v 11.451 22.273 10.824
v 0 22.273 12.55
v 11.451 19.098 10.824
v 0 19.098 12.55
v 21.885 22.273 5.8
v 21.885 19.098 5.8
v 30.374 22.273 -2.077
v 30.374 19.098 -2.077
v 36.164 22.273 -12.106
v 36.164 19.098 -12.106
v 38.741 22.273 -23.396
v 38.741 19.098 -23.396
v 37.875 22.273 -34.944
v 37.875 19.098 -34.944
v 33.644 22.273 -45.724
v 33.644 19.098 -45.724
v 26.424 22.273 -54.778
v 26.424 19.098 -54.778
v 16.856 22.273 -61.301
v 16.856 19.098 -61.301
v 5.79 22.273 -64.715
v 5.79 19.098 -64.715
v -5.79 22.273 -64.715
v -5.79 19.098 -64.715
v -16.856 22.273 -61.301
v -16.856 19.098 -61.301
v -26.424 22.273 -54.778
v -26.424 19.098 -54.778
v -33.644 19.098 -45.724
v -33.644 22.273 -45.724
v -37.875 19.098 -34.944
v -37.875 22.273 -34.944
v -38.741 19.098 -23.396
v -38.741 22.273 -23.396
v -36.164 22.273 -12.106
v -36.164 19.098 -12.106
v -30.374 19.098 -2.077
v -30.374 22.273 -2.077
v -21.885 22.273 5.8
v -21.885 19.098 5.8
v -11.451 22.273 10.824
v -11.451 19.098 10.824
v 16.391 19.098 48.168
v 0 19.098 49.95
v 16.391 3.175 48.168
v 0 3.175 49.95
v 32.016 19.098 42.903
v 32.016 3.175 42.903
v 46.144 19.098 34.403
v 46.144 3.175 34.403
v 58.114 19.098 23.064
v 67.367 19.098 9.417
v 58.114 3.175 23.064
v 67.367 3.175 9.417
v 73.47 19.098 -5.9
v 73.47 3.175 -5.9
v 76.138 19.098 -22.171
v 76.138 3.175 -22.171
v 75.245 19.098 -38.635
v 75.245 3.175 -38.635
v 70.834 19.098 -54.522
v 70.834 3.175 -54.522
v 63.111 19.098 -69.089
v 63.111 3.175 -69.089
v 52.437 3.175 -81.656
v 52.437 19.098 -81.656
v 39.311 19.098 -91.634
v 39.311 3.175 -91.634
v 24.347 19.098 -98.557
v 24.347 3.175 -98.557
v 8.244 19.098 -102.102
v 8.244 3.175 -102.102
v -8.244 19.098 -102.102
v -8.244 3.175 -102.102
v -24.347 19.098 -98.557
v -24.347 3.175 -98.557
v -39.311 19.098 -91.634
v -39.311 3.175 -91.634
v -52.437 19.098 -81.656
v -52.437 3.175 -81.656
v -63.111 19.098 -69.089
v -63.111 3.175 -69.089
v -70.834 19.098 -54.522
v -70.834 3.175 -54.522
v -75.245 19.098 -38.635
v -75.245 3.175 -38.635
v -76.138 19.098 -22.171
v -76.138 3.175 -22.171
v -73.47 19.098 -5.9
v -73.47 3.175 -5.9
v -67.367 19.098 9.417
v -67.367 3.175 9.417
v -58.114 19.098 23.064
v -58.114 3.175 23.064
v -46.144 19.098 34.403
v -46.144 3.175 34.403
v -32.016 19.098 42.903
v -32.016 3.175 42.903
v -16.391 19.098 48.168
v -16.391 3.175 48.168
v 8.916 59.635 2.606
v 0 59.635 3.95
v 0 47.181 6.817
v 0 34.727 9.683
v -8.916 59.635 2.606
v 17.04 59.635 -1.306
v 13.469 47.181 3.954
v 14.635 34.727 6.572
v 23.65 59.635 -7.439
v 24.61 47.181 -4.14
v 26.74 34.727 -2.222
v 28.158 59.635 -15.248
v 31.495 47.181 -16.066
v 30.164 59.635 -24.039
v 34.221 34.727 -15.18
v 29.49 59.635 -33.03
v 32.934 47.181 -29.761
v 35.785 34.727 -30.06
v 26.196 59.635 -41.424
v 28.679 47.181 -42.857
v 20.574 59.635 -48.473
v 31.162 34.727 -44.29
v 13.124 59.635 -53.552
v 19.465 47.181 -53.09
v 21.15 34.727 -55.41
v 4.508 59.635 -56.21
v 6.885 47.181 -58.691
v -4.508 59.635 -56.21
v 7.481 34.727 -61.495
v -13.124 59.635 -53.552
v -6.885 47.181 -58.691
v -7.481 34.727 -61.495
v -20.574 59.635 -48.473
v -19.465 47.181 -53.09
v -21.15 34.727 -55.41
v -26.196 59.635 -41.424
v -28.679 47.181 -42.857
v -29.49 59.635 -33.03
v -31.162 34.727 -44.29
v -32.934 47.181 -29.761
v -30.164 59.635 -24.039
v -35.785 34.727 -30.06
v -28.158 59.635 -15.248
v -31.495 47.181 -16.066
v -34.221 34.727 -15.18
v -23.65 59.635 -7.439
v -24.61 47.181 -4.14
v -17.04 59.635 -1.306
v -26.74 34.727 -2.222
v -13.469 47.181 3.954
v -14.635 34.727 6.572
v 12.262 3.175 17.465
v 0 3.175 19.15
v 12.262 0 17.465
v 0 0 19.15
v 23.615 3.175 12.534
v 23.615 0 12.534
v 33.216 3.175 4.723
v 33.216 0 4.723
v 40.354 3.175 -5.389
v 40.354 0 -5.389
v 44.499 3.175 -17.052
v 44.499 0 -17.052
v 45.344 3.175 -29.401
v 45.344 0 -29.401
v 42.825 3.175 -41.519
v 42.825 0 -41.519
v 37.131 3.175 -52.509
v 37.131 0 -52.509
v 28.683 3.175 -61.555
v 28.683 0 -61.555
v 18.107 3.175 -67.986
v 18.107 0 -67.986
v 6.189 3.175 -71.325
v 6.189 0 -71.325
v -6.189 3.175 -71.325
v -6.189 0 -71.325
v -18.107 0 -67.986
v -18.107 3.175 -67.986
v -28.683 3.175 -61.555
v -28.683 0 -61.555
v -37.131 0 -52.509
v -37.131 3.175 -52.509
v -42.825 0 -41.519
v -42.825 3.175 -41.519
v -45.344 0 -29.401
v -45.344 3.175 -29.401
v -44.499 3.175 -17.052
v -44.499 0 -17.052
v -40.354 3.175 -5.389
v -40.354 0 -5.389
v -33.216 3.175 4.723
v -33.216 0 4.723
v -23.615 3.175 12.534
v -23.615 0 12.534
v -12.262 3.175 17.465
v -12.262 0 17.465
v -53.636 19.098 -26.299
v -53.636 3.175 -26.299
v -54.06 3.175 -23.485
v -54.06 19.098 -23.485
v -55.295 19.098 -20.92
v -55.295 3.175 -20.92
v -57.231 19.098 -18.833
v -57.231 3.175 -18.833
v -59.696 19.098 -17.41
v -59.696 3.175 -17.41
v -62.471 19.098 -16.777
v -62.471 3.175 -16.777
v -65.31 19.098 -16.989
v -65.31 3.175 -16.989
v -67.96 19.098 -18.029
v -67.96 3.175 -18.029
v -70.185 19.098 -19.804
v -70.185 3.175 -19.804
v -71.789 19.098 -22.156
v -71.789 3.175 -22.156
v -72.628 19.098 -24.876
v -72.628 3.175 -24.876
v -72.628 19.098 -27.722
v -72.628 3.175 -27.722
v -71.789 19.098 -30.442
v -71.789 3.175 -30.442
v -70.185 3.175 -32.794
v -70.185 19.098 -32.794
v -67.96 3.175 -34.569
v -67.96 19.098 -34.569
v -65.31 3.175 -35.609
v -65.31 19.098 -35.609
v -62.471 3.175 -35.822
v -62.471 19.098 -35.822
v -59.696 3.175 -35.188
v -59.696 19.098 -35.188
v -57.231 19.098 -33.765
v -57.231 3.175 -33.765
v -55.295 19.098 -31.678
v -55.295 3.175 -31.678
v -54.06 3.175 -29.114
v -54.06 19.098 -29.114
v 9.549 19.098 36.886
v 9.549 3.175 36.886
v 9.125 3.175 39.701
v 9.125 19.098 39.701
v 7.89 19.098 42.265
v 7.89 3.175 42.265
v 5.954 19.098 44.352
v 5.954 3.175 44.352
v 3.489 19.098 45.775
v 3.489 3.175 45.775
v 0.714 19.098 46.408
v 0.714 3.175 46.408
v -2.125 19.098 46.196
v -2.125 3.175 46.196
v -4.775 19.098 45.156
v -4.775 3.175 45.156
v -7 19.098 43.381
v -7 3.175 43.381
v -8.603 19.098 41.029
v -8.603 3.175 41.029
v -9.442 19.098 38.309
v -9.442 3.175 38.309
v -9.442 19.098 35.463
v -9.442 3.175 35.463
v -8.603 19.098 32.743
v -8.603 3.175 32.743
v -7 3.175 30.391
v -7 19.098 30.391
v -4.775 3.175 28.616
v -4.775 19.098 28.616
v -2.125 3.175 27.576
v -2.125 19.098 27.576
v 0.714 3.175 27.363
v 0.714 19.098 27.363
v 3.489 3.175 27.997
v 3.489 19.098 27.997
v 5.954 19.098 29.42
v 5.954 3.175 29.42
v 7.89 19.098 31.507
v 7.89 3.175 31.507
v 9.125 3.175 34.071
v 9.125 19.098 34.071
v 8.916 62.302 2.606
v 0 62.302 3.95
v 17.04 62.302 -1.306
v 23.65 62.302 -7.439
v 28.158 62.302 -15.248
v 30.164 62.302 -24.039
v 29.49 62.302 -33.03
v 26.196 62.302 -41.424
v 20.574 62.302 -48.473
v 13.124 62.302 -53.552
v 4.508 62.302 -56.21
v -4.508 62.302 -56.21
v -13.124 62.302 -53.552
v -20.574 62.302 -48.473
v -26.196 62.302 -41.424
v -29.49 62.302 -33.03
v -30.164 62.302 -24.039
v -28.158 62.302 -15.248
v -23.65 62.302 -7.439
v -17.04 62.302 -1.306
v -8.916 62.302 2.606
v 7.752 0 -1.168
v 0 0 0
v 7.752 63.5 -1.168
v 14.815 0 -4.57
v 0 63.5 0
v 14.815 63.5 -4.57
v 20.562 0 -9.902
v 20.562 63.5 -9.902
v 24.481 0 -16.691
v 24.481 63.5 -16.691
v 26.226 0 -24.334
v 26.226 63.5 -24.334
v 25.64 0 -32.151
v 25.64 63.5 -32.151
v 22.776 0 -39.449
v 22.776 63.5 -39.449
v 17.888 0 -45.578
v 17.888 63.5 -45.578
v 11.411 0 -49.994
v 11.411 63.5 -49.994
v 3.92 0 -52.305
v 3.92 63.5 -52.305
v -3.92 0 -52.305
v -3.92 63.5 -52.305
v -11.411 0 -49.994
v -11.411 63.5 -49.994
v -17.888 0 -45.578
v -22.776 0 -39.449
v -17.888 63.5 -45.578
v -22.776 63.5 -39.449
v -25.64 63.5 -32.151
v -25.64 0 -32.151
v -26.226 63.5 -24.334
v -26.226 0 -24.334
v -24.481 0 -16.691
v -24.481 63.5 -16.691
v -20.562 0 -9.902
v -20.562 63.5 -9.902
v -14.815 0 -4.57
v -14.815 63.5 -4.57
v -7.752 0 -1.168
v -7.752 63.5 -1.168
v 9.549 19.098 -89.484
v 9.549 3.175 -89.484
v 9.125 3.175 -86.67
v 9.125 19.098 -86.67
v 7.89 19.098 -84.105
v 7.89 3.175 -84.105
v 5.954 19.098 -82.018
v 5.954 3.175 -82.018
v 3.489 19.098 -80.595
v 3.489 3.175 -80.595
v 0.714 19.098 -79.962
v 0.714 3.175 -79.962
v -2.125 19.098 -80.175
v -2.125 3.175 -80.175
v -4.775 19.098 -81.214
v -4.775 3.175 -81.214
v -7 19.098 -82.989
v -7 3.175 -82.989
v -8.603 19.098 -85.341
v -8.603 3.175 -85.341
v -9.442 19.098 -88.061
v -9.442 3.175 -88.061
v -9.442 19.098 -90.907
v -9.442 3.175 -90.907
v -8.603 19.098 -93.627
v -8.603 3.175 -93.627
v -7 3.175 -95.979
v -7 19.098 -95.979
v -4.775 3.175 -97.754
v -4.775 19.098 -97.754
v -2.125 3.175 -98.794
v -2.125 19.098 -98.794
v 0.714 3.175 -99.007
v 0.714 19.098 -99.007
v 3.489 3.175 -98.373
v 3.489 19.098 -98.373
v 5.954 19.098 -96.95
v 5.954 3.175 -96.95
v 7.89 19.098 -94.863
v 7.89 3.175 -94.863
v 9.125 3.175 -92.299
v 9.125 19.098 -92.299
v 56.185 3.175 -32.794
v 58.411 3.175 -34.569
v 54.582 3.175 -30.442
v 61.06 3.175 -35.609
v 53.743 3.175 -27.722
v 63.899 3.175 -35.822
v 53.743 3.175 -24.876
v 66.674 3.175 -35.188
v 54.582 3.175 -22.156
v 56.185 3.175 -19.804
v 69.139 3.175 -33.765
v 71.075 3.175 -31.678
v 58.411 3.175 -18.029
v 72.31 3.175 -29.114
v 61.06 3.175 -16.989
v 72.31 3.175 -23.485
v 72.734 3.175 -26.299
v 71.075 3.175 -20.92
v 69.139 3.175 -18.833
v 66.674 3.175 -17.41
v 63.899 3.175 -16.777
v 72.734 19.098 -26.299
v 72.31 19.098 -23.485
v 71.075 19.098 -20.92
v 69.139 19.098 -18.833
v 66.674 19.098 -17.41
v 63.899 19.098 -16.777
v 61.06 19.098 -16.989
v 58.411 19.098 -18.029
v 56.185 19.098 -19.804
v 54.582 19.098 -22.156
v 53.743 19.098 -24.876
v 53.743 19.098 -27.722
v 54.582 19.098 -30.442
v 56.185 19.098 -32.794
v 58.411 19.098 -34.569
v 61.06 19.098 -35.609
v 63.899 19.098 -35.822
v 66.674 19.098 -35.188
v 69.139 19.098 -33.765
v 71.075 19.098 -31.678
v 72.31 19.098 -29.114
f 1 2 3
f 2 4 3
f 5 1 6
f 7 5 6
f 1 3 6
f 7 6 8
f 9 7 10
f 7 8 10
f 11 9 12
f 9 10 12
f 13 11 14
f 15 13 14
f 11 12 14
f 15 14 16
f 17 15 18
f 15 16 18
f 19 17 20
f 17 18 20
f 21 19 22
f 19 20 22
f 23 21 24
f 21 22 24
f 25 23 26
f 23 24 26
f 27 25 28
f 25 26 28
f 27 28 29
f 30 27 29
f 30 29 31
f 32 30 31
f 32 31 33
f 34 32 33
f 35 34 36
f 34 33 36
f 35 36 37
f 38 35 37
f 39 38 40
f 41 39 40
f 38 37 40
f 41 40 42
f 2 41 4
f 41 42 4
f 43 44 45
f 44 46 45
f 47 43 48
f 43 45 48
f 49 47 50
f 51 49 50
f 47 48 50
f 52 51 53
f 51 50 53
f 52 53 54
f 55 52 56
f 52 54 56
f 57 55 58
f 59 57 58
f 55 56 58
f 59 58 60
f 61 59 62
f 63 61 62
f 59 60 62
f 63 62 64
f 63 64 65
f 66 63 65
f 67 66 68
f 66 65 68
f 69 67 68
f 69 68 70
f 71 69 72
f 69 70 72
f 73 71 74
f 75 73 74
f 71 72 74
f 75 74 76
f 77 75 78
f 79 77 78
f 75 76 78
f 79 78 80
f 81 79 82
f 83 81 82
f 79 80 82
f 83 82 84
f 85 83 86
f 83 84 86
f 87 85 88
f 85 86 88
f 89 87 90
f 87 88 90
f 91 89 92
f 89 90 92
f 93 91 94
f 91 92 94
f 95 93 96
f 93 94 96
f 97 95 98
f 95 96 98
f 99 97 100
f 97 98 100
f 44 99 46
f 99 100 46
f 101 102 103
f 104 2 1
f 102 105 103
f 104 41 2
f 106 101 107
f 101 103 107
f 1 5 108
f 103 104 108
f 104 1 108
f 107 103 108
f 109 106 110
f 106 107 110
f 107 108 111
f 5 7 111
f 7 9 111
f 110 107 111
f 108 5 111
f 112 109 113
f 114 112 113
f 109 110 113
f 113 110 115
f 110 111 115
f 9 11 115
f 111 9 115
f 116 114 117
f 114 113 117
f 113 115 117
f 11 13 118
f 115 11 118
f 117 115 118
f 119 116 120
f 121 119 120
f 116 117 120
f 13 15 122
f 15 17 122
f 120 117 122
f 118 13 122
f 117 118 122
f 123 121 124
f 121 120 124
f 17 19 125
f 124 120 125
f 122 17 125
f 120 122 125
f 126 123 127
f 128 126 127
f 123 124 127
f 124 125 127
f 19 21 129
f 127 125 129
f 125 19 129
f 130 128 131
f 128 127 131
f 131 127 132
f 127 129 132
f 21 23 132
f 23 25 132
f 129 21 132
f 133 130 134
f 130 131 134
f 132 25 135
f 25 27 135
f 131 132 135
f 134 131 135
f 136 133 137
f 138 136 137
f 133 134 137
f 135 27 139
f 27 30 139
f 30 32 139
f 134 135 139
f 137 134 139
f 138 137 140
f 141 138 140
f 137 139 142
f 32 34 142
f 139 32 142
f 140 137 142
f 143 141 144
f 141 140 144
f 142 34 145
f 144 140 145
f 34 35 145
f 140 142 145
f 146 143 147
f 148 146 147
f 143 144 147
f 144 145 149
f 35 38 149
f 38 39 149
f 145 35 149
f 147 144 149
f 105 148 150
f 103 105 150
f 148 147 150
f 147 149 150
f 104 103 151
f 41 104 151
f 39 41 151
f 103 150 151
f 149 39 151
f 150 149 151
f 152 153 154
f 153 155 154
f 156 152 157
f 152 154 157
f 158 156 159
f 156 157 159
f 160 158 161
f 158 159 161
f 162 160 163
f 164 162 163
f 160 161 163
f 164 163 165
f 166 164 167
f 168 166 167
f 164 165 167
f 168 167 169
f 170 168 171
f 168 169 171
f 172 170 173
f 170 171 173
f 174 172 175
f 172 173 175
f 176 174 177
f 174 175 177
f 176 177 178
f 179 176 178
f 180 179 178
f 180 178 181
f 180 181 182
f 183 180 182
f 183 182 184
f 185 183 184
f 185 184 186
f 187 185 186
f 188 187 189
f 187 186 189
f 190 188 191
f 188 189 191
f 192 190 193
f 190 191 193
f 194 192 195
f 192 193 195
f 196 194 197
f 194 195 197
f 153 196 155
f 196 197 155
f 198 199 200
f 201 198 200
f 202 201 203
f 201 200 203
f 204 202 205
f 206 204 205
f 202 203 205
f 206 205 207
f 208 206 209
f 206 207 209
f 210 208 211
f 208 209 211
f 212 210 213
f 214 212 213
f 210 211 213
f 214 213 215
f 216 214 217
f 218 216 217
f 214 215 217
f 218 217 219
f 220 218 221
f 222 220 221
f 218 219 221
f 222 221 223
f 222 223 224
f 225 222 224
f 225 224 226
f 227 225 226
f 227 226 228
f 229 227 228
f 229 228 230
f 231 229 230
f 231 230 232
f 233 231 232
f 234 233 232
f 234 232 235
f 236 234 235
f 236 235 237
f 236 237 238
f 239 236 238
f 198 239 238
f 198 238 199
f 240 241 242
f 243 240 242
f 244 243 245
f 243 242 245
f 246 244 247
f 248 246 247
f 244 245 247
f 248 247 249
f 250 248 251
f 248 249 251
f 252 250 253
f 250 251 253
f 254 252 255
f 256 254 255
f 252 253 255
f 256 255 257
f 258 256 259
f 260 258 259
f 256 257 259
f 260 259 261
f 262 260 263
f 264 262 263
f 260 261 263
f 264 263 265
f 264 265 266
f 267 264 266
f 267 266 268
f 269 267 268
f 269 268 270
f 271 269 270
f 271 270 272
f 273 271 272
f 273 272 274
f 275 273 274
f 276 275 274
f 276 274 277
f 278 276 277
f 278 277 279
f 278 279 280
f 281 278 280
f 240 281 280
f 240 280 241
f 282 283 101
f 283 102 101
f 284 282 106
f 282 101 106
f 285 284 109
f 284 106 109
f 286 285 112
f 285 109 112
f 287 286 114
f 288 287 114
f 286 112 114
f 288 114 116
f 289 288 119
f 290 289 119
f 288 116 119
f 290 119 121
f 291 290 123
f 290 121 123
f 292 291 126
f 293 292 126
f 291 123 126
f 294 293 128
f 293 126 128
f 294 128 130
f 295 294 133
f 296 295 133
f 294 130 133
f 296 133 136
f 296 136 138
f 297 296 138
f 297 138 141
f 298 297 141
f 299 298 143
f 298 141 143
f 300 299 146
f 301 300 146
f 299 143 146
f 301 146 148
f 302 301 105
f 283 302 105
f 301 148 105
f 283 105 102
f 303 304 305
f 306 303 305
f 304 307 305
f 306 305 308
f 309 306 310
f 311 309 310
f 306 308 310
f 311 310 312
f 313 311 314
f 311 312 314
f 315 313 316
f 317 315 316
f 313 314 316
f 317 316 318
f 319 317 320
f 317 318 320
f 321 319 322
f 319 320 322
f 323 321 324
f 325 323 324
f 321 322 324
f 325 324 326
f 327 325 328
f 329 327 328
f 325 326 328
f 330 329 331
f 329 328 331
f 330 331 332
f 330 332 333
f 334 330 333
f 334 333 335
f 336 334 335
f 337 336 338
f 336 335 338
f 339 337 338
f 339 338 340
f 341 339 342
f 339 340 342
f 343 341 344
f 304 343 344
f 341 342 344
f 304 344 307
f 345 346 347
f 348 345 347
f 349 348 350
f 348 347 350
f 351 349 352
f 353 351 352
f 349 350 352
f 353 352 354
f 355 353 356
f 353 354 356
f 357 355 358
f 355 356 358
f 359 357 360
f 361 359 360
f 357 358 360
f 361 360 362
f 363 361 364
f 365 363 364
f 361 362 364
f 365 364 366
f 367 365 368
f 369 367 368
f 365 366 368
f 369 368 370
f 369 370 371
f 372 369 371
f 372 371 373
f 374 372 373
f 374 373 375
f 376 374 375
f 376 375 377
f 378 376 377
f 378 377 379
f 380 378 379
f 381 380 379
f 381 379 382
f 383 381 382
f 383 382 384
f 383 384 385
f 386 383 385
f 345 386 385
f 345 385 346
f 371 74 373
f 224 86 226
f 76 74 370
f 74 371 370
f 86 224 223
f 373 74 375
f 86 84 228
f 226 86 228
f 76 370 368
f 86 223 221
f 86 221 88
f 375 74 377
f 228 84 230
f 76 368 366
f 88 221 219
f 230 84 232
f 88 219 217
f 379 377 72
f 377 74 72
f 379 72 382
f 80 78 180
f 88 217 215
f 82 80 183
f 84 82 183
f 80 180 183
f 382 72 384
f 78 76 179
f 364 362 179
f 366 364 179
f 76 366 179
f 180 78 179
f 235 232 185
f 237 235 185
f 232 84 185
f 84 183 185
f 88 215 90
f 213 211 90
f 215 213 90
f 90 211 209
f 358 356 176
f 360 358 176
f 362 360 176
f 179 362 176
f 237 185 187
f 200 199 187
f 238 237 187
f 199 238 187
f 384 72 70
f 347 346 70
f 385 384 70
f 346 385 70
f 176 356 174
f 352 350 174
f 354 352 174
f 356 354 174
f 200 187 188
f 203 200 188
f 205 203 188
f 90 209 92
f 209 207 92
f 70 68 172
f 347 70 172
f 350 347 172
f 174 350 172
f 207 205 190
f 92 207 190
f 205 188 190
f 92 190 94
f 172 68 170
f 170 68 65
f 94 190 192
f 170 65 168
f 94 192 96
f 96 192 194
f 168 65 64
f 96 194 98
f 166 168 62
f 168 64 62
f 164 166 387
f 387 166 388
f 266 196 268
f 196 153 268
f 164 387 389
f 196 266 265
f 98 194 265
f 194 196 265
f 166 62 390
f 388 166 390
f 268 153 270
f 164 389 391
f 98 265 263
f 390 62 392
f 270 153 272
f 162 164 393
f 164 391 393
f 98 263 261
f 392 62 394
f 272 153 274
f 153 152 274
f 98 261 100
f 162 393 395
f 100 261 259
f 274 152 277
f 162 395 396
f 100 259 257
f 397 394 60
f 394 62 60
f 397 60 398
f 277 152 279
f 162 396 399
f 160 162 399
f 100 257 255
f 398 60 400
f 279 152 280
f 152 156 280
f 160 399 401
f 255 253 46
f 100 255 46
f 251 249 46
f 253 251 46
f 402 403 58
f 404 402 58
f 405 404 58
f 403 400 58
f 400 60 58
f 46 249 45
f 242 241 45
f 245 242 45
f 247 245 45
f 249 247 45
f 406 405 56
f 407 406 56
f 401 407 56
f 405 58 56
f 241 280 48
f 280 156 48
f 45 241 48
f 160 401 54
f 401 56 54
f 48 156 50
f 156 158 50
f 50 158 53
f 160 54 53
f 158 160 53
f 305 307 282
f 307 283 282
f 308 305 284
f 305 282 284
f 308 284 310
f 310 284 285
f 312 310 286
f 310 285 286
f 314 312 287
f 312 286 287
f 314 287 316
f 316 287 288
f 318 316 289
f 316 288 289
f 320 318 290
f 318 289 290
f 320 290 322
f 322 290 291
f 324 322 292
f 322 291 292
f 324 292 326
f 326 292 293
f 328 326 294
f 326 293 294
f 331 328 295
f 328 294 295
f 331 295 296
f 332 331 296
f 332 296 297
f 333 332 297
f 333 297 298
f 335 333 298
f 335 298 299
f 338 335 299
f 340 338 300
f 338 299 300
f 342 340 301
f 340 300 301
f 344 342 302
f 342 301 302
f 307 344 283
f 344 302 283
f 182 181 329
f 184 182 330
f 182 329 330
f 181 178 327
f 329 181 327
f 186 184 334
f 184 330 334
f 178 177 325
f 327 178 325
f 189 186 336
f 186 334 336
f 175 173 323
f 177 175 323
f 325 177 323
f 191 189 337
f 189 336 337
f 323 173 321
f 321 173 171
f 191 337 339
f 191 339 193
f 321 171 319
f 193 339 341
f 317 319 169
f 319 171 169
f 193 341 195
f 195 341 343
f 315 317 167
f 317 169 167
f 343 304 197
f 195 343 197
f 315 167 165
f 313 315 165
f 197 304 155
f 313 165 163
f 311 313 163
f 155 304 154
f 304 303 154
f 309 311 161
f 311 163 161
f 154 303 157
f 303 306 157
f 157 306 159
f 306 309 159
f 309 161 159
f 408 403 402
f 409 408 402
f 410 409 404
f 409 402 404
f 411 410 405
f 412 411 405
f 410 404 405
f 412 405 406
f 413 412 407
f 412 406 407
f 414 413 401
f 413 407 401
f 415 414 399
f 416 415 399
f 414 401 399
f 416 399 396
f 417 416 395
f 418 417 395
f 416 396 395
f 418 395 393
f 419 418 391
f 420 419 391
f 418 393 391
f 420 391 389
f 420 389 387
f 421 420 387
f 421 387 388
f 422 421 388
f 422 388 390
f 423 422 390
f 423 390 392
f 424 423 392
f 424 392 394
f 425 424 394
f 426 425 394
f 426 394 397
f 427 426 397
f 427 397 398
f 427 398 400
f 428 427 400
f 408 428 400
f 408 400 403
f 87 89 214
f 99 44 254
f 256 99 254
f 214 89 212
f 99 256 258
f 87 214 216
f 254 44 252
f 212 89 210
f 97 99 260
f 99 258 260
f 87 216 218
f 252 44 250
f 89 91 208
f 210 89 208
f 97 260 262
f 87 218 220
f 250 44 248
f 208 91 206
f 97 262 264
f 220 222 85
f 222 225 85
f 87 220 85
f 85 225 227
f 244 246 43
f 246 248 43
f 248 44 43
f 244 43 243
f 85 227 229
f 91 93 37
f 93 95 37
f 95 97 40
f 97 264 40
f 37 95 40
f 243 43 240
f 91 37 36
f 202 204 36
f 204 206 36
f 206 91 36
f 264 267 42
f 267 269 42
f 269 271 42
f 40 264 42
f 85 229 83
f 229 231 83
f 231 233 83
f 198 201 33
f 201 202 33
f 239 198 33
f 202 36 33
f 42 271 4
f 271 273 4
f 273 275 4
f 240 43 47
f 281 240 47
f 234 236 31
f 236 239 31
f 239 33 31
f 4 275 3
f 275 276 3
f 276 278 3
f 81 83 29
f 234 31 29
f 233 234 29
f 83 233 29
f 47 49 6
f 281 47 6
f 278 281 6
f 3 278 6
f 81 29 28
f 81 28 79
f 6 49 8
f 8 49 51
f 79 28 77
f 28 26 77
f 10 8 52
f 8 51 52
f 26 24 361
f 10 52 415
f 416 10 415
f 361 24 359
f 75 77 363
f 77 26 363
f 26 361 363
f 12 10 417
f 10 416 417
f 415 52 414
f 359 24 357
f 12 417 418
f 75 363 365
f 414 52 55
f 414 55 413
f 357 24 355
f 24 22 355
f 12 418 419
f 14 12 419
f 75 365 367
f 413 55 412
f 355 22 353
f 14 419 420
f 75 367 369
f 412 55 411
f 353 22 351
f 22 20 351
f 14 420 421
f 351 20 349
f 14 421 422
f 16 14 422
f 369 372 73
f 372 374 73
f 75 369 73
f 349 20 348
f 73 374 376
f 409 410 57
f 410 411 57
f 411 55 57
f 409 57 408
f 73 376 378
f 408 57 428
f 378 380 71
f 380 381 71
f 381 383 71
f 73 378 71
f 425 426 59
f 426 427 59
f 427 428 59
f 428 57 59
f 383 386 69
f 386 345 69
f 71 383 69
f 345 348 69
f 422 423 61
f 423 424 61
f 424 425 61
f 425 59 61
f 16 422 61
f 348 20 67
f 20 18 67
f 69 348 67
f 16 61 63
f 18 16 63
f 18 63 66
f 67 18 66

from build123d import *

# Parameters (mm, degrees)
F2_R     = 9.54913
F3_DEPTH = 60.326


with BuildPart() as f1:
    # F0 (on Right) → F1 (revolve)
    with BuildSketch(Plane.YZ):
        Polygon((0, 19.15033), (0, 0), (63.5, 0), (62.302494, 3.9497), (59.635494, 3.9497), (22.27326, 12.55014), (19.09826, 12.55014), (19.09826, 49.95037), (3.175, 49.95037), (3.175, 19.15033), align=None)
    revolve(axis=Axis((0, 4.994582, -26.29916), (0, 1, 0)))

    # F2 (on face) → F3 (cut, through all)
    with BuildSketch(Plane.XZ.offset(-3.175)):
        with Locations((0, 36.885909)):
            Circle(F2_R)
        with Locations((63.185069, -26.29916)):
            Circle(F2_R)
        with Locations((0, -89.484229)):
            Circle(F2_R)
        with Locations((-63.185069, -26.29916)):
            Circle(F2_R)
    extrude(amount=-F3_DEPTH, mode=Mode.SUBTRACT)


solid = f1.part
